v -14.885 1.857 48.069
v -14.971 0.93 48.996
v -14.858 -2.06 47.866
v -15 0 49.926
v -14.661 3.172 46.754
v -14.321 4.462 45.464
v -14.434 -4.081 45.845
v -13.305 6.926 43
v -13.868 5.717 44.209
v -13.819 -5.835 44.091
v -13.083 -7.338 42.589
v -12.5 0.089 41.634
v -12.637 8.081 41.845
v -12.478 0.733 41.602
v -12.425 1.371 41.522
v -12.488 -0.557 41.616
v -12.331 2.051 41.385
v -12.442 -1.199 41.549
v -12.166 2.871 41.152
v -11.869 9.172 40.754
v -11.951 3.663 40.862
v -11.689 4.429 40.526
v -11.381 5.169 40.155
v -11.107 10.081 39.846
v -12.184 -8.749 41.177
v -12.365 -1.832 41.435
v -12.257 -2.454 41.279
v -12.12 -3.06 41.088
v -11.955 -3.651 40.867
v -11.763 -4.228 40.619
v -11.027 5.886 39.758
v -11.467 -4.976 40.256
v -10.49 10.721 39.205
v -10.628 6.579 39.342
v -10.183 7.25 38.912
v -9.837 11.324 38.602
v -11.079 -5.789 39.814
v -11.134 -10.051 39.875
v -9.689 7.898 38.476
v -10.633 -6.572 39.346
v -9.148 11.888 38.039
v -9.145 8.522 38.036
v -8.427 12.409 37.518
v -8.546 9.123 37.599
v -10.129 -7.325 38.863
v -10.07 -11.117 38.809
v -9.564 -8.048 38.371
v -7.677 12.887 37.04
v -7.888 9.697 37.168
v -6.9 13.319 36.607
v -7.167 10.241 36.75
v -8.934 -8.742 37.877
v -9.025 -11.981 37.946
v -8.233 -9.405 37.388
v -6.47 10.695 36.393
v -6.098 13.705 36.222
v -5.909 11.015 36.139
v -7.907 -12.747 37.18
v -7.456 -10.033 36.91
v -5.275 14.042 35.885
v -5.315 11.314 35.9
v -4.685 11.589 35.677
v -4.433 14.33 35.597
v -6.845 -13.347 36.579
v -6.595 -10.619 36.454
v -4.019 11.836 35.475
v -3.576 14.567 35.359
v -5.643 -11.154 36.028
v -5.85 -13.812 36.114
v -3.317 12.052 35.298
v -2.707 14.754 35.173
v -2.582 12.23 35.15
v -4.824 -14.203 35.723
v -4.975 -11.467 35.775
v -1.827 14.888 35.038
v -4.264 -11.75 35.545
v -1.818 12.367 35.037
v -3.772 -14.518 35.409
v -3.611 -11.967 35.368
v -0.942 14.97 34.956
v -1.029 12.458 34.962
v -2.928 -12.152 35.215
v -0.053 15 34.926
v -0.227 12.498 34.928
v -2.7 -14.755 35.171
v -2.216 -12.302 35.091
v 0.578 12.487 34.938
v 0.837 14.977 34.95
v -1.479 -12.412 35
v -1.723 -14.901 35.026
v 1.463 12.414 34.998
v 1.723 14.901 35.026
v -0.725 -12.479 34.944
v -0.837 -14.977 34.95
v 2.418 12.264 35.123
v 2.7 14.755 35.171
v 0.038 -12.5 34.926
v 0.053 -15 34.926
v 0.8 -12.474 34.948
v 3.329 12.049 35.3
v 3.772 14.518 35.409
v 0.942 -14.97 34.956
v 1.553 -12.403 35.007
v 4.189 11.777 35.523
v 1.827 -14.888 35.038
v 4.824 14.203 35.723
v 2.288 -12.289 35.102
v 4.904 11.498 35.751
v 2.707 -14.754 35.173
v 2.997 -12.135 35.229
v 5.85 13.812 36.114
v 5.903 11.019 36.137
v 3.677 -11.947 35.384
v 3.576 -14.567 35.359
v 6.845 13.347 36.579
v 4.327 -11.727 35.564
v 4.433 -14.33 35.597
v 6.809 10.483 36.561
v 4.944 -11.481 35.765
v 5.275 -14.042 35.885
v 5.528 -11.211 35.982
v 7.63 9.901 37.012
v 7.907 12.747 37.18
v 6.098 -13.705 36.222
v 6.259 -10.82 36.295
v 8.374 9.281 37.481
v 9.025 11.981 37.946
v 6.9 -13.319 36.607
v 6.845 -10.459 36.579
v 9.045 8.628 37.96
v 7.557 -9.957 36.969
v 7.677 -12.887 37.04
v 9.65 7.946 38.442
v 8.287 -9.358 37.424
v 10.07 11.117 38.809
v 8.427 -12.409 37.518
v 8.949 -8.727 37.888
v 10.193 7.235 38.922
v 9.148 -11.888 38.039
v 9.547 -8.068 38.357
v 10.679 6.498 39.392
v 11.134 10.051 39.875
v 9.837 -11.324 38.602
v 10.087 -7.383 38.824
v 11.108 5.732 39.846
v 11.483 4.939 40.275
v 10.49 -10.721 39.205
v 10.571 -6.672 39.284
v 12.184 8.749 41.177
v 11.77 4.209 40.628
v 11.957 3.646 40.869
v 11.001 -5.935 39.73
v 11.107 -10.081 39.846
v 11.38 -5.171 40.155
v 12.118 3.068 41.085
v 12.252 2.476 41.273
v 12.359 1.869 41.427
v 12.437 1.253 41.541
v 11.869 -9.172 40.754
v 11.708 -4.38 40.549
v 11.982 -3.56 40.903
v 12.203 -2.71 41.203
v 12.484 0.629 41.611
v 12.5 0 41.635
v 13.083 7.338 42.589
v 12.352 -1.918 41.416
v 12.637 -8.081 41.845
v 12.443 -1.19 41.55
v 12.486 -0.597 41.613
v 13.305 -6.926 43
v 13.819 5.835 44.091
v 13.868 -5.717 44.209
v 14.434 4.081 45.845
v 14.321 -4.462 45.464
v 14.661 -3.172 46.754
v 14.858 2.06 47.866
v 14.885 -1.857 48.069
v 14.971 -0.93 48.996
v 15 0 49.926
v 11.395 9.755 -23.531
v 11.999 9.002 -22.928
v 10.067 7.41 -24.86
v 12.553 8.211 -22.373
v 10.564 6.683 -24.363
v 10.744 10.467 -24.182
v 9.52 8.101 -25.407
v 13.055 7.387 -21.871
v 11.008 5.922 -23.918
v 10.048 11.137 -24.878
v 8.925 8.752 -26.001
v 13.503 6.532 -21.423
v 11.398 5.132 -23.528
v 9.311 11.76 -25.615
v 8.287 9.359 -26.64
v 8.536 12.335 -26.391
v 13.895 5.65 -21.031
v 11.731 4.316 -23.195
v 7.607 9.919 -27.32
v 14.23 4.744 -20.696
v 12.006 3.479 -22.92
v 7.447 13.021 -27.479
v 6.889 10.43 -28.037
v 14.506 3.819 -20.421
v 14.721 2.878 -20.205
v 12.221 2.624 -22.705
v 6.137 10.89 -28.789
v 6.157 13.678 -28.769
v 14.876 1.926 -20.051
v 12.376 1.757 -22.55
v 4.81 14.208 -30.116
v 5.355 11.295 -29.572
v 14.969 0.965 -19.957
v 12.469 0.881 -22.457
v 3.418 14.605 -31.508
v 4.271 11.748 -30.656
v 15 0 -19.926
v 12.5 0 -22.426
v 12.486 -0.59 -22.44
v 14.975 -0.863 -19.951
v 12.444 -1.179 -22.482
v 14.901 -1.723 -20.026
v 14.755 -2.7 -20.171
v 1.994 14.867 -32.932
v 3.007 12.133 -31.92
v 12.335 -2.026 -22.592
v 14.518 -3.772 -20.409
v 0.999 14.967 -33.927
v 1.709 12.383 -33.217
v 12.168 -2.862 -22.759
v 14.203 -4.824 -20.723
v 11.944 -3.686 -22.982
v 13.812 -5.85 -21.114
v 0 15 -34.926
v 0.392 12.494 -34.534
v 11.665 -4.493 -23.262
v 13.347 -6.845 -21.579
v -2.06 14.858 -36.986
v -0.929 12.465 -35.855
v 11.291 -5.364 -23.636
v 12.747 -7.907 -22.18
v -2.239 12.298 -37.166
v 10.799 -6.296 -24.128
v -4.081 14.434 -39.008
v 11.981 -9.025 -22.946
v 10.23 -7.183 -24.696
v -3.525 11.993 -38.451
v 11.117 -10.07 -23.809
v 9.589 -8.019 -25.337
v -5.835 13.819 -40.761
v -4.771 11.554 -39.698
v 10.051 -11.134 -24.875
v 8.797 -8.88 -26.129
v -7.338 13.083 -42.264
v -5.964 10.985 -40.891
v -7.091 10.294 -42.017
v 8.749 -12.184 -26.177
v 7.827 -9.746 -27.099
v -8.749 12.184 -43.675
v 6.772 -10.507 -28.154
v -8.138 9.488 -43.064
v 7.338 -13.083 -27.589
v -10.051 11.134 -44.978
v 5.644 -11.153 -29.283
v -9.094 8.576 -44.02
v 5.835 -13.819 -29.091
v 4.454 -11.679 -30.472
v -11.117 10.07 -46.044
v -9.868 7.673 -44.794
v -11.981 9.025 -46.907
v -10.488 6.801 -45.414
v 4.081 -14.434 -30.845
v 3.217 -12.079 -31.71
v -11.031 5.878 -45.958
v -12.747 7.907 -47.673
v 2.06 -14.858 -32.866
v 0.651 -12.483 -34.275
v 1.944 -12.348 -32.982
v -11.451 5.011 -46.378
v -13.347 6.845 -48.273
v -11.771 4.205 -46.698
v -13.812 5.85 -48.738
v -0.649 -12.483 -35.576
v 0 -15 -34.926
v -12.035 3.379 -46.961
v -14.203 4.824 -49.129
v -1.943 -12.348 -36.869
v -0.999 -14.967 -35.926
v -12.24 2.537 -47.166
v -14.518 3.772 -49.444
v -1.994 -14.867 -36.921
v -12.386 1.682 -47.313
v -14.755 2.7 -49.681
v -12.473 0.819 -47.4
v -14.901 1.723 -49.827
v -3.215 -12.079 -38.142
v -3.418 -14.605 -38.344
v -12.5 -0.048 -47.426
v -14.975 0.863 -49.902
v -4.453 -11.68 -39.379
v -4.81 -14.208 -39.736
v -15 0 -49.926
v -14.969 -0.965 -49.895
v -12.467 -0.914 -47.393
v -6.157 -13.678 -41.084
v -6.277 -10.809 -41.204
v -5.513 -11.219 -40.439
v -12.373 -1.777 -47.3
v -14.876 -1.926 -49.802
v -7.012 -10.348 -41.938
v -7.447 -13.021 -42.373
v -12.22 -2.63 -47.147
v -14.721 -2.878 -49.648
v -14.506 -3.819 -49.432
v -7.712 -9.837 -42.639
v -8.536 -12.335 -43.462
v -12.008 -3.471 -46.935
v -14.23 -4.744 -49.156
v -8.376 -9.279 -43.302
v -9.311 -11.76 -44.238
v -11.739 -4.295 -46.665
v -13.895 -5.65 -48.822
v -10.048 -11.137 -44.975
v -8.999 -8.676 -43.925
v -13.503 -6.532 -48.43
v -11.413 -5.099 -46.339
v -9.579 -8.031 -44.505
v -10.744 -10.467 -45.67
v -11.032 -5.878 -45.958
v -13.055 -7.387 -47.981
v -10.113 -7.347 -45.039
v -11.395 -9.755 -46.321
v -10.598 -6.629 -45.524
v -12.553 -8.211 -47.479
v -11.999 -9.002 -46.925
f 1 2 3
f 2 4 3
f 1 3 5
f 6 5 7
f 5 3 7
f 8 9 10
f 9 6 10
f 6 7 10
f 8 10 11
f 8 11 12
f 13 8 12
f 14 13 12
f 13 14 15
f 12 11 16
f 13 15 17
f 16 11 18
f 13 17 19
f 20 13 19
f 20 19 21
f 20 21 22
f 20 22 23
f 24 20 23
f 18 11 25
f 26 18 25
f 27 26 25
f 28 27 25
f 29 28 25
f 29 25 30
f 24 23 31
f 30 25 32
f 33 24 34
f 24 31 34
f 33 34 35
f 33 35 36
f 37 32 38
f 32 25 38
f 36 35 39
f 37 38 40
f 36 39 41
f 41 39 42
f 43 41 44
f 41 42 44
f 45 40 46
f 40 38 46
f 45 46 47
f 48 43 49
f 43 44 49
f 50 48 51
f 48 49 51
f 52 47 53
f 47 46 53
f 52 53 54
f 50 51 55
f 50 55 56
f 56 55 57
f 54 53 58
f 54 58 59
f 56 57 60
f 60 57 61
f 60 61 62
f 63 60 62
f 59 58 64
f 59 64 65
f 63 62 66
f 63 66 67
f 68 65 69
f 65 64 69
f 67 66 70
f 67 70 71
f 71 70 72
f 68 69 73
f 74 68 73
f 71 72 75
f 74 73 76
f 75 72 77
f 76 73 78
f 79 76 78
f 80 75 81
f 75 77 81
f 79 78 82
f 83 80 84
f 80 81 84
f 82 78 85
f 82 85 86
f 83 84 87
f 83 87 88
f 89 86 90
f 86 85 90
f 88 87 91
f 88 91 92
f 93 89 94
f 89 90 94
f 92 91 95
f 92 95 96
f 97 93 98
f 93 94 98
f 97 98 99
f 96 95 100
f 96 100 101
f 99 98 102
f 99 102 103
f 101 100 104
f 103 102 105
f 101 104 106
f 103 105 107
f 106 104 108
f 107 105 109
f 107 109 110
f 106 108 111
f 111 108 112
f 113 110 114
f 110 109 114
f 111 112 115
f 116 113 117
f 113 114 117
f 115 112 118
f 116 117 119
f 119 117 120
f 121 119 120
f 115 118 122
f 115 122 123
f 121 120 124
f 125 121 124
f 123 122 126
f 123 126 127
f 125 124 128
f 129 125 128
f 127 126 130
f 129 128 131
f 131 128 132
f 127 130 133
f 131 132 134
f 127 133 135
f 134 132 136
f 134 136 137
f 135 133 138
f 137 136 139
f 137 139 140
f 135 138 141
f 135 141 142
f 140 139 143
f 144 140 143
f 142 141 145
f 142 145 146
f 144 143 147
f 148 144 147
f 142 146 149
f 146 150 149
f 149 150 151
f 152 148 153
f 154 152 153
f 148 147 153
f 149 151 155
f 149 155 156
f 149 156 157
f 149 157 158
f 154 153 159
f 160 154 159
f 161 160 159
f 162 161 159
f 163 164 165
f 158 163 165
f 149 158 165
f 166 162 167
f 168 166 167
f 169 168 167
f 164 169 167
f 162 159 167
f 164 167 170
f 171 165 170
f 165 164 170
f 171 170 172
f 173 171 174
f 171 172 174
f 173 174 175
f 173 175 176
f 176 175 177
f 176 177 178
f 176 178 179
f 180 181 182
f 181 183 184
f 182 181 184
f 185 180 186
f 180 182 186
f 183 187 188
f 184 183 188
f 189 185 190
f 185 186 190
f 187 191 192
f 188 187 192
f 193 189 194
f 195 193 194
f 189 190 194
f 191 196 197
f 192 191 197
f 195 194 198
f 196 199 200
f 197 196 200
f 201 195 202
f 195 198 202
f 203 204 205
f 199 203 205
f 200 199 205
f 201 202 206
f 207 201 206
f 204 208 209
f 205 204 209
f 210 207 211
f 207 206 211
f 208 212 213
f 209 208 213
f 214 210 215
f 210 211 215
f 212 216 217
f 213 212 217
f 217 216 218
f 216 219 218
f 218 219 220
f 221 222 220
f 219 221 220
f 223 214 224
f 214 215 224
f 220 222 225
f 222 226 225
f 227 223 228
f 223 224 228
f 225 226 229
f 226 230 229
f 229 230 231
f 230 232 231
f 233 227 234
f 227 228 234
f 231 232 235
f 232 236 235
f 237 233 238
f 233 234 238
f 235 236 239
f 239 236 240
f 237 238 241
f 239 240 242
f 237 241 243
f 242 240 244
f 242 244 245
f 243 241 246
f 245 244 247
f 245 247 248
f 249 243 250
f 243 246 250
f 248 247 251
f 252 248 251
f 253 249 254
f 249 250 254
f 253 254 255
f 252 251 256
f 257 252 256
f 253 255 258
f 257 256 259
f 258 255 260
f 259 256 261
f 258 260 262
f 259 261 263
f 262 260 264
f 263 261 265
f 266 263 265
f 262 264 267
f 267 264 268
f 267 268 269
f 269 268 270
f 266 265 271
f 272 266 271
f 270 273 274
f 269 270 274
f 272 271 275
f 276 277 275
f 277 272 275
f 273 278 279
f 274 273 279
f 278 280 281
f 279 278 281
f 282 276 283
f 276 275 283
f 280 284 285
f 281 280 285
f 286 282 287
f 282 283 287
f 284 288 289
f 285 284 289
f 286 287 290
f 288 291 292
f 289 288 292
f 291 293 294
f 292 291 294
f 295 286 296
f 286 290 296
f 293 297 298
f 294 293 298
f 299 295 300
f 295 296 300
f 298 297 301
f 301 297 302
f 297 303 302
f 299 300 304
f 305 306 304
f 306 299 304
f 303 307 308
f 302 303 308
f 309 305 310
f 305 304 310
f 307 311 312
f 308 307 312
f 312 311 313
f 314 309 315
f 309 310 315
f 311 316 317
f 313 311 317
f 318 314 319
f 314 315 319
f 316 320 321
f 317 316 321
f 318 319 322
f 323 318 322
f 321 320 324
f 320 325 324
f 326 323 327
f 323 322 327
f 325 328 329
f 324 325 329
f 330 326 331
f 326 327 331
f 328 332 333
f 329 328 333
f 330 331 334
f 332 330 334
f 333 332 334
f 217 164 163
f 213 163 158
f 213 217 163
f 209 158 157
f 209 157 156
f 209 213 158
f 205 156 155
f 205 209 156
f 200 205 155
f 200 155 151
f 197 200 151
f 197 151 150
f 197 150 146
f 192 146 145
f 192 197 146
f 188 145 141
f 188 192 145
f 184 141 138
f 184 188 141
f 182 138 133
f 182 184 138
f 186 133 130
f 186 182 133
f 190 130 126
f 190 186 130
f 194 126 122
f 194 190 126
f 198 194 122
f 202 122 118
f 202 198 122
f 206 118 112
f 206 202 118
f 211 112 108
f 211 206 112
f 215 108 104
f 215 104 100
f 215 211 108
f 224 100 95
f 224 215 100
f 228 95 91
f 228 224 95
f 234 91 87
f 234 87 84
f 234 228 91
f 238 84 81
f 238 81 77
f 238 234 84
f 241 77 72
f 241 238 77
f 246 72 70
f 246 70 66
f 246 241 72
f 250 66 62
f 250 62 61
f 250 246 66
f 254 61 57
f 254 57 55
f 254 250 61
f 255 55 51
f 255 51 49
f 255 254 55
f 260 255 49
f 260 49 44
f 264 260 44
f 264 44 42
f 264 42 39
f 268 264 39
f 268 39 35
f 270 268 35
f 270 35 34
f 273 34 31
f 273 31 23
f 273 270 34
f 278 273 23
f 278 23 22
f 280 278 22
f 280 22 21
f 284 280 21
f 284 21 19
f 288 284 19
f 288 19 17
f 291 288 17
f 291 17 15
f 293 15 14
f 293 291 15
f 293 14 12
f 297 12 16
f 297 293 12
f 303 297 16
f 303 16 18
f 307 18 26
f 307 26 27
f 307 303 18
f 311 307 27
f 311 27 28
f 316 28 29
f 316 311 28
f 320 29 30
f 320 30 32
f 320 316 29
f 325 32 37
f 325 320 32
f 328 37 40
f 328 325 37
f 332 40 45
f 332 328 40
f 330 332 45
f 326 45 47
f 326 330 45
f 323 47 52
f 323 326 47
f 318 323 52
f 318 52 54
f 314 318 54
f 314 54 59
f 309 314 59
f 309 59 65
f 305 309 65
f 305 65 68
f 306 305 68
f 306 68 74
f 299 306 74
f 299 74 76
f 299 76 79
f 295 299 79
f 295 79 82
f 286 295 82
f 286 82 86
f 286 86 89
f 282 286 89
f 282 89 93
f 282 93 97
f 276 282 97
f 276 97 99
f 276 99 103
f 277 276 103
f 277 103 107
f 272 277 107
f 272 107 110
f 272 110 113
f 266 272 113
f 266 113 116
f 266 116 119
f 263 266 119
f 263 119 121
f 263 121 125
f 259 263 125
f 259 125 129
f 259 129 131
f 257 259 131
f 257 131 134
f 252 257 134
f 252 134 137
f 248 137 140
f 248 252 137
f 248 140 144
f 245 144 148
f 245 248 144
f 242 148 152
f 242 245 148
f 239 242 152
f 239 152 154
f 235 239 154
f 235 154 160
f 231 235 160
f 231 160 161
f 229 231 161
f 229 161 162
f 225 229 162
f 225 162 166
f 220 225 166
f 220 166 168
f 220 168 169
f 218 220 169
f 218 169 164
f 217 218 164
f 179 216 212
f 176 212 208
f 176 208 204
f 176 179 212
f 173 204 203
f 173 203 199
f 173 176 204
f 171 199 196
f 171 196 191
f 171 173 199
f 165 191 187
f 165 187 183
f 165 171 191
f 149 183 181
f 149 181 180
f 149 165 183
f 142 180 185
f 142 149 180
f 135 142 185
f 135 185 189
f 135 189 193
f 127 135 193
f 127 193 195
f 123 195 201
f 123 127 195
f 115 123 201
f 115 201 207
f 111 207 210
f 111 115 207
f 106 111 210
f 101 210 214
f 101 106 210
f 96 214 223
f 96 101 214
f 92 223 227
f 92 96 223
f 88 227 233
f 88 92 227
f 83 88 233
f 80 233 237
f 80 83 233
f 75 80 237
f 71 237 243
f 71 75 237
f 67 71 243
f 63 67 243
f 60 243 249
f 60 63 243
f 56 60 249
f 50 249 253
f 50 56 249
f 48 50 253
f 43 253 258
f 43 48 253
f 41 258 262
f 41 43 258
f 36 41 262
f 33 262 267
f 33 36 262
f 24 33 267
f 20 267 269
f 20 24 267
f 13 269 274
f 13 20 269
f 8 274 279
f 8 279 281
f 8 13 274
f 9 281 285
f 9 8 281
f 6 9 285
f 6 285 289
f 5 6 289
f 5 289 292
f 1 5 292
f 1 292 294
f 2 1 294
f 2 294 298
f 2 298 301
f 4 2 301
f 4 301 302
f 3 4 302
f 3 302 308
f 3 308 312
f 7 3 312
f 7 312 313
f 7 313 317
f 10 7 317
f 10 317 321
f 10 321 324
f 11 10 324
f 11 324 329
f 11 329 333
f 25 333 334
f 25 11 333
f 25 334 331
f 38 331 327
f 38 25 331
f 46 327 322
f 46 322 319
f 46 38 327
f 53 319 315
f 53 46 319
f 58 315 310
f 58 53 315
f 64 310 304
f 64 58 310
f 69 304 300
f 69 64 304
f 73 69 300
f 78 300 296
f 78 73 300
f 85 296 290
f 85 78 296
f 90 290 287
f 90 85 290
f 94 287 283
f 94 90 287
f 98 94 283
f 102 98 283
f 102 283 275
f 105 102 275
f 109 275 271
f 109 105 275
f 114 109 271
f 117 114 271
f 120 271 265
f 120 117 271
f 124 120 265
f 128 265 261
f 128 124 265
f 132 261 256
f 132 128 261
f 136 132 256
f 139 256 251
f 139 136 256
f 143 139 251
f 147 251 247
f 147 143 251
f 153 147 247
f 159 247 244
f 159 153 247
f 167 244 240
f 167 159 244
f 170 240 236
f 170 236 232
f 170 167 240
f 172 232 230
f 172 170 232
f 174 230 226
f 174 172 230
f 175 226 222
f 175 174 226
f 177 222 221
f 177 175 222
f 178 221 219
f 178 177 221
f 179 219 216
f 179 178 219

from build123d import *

# Parameters (mm, degrees)
F0_R     = 15
F0_R_2   = 12.5
F1_DEPTH = 49.9264
F2_R     = 15
F3_DEPTH = 25
F5_DEPTH = 15
F6_DEPTH = 25


with BuildPart() as f1:
    # F0 (on Top) → F1 (new body, symmetric)
    with BuildSketch(Plane.XY):
        Circle(F0_R)
        Circle(F0_R_2, mode=Mode.SUBTRACT)
    extrude(amount=F1_DEPTH, both=True)

    # F2 (on Front) → F3 (cut, symmetric)
    with BuildSketch(Plane.XZ):
        with Locations((0, 49.9264)):
            Circle(F2_R)
    extrude(amount=F3_DEPTH, both=True, mode=Mode.SUBTRACT)

    # F4 (on Front) → F5 (cut, symmetric)
    with BuildSketch(Plane.XZ):
        Polygon((15, -19.9264), (-15, -49.9264), (15, -49.9264), align=None)
    extrude(amount=F5_DEPTH, both=True, mode=Mode.SUBTRACT)

    # F4 (on Front) → F6 (cut, symmetric)
    with BuildSketch(Plane.XZ):
        Polygon((15, -19.9264), (-15, -49.9264), (15, -49.9264), align=None)
    extrude(amount=F6_DEPTH, both=True, mode=Mode.SUBTRACT)


solid = f1.part
